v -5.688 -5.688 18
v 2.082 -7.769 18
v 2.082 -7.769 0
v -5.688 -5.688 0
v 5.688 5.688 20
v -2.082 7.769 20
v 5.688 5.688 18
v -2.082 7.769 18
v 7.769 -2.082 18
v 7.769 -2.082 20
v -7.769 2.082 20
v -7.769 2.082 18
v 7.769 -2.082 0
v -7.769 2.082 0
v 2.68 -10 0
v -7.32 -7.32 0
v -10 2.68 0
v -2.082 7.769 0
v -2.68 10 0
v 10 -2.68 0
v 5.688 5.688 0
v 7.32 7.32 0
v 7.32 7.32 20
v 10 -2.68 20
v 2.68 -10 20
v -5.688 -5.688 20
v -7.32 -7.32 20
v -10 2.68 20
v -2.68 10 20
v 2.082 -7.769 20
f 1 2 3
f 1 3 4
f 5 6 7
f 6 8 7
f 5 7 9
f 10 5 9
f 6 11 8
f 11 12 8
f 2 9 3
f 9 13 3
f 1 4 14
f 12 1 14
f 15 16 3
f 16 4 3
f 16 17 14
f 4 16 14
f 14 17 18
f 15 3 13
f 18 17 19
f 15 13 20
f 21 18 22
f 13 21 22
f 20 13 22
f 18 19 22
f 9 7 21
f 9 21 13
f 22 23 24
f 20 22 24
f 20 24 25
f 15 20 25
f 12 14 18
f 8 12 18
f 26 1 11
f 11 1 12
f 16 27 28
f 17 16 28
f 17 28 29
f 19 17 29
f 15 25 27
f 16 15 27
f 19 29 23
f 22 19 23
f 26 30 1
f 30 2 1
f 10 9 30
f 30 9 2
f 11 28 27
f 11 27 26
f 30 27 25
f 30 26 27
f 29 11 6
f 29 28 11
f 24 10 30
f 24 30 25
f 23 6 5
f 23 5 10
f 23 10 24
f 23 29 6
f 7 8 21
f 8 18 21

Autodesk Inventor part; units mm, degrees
ref_plane "YZ Plane" through (0, 0, 0) normal (1, 0, 0) x (0, 1, 0)
ref_plane "XZ Plane" through (0, 0, 0) normal (0, 1, 0) x (-1, 0, 0)
ref_plane "XY Plane" through (0, 0, 0) normal (0, 0, 1) x (1, 0, 0)
sketch "Sketch1" plane through (0, 0, 0) normal (0, 0, 1) x (1, 0, 0)
  line L0 (-2.6795, 10) -> (7.3205, 7.3205)
  line L1 (7.3205, 7.3205) -> (10, -2.6795)
  line L2 (10, -2.6795) -> (2.6795, -10)
  line L3 (2.6795, -10) -> (-7.3205, -7.3205)
  line L4 (-7.3205, -7.3205) -> (-10, 2.6795)
  line L5 (-10, 2.6795) -> (-2.6795, 10)
  point P0 (0, 0)
  point P1 (0, 0)
  dimension "d0" = 10
  dimension "d2" = 10
extrude "Extrusion1" add sketch "Sketch1" along normal blind 20
shell "Shell1" thickness 2 removed faces 1 at (-3.3333, 0.8932, 20)
shell "Shell2" thickness 2 removed faces 8 at (-3.3333, 0.8932, 0) at (-5.8735, 3.9776, 14) at (0.508, 7.0754, 8) at (6.3814, 3.0978, 14) at (5.8735, -3.9776, 14) at (-0.508, -7.0754, 14) at (-7.0754, -0.508, 8) at (1.8958, 1.8958, 2)
